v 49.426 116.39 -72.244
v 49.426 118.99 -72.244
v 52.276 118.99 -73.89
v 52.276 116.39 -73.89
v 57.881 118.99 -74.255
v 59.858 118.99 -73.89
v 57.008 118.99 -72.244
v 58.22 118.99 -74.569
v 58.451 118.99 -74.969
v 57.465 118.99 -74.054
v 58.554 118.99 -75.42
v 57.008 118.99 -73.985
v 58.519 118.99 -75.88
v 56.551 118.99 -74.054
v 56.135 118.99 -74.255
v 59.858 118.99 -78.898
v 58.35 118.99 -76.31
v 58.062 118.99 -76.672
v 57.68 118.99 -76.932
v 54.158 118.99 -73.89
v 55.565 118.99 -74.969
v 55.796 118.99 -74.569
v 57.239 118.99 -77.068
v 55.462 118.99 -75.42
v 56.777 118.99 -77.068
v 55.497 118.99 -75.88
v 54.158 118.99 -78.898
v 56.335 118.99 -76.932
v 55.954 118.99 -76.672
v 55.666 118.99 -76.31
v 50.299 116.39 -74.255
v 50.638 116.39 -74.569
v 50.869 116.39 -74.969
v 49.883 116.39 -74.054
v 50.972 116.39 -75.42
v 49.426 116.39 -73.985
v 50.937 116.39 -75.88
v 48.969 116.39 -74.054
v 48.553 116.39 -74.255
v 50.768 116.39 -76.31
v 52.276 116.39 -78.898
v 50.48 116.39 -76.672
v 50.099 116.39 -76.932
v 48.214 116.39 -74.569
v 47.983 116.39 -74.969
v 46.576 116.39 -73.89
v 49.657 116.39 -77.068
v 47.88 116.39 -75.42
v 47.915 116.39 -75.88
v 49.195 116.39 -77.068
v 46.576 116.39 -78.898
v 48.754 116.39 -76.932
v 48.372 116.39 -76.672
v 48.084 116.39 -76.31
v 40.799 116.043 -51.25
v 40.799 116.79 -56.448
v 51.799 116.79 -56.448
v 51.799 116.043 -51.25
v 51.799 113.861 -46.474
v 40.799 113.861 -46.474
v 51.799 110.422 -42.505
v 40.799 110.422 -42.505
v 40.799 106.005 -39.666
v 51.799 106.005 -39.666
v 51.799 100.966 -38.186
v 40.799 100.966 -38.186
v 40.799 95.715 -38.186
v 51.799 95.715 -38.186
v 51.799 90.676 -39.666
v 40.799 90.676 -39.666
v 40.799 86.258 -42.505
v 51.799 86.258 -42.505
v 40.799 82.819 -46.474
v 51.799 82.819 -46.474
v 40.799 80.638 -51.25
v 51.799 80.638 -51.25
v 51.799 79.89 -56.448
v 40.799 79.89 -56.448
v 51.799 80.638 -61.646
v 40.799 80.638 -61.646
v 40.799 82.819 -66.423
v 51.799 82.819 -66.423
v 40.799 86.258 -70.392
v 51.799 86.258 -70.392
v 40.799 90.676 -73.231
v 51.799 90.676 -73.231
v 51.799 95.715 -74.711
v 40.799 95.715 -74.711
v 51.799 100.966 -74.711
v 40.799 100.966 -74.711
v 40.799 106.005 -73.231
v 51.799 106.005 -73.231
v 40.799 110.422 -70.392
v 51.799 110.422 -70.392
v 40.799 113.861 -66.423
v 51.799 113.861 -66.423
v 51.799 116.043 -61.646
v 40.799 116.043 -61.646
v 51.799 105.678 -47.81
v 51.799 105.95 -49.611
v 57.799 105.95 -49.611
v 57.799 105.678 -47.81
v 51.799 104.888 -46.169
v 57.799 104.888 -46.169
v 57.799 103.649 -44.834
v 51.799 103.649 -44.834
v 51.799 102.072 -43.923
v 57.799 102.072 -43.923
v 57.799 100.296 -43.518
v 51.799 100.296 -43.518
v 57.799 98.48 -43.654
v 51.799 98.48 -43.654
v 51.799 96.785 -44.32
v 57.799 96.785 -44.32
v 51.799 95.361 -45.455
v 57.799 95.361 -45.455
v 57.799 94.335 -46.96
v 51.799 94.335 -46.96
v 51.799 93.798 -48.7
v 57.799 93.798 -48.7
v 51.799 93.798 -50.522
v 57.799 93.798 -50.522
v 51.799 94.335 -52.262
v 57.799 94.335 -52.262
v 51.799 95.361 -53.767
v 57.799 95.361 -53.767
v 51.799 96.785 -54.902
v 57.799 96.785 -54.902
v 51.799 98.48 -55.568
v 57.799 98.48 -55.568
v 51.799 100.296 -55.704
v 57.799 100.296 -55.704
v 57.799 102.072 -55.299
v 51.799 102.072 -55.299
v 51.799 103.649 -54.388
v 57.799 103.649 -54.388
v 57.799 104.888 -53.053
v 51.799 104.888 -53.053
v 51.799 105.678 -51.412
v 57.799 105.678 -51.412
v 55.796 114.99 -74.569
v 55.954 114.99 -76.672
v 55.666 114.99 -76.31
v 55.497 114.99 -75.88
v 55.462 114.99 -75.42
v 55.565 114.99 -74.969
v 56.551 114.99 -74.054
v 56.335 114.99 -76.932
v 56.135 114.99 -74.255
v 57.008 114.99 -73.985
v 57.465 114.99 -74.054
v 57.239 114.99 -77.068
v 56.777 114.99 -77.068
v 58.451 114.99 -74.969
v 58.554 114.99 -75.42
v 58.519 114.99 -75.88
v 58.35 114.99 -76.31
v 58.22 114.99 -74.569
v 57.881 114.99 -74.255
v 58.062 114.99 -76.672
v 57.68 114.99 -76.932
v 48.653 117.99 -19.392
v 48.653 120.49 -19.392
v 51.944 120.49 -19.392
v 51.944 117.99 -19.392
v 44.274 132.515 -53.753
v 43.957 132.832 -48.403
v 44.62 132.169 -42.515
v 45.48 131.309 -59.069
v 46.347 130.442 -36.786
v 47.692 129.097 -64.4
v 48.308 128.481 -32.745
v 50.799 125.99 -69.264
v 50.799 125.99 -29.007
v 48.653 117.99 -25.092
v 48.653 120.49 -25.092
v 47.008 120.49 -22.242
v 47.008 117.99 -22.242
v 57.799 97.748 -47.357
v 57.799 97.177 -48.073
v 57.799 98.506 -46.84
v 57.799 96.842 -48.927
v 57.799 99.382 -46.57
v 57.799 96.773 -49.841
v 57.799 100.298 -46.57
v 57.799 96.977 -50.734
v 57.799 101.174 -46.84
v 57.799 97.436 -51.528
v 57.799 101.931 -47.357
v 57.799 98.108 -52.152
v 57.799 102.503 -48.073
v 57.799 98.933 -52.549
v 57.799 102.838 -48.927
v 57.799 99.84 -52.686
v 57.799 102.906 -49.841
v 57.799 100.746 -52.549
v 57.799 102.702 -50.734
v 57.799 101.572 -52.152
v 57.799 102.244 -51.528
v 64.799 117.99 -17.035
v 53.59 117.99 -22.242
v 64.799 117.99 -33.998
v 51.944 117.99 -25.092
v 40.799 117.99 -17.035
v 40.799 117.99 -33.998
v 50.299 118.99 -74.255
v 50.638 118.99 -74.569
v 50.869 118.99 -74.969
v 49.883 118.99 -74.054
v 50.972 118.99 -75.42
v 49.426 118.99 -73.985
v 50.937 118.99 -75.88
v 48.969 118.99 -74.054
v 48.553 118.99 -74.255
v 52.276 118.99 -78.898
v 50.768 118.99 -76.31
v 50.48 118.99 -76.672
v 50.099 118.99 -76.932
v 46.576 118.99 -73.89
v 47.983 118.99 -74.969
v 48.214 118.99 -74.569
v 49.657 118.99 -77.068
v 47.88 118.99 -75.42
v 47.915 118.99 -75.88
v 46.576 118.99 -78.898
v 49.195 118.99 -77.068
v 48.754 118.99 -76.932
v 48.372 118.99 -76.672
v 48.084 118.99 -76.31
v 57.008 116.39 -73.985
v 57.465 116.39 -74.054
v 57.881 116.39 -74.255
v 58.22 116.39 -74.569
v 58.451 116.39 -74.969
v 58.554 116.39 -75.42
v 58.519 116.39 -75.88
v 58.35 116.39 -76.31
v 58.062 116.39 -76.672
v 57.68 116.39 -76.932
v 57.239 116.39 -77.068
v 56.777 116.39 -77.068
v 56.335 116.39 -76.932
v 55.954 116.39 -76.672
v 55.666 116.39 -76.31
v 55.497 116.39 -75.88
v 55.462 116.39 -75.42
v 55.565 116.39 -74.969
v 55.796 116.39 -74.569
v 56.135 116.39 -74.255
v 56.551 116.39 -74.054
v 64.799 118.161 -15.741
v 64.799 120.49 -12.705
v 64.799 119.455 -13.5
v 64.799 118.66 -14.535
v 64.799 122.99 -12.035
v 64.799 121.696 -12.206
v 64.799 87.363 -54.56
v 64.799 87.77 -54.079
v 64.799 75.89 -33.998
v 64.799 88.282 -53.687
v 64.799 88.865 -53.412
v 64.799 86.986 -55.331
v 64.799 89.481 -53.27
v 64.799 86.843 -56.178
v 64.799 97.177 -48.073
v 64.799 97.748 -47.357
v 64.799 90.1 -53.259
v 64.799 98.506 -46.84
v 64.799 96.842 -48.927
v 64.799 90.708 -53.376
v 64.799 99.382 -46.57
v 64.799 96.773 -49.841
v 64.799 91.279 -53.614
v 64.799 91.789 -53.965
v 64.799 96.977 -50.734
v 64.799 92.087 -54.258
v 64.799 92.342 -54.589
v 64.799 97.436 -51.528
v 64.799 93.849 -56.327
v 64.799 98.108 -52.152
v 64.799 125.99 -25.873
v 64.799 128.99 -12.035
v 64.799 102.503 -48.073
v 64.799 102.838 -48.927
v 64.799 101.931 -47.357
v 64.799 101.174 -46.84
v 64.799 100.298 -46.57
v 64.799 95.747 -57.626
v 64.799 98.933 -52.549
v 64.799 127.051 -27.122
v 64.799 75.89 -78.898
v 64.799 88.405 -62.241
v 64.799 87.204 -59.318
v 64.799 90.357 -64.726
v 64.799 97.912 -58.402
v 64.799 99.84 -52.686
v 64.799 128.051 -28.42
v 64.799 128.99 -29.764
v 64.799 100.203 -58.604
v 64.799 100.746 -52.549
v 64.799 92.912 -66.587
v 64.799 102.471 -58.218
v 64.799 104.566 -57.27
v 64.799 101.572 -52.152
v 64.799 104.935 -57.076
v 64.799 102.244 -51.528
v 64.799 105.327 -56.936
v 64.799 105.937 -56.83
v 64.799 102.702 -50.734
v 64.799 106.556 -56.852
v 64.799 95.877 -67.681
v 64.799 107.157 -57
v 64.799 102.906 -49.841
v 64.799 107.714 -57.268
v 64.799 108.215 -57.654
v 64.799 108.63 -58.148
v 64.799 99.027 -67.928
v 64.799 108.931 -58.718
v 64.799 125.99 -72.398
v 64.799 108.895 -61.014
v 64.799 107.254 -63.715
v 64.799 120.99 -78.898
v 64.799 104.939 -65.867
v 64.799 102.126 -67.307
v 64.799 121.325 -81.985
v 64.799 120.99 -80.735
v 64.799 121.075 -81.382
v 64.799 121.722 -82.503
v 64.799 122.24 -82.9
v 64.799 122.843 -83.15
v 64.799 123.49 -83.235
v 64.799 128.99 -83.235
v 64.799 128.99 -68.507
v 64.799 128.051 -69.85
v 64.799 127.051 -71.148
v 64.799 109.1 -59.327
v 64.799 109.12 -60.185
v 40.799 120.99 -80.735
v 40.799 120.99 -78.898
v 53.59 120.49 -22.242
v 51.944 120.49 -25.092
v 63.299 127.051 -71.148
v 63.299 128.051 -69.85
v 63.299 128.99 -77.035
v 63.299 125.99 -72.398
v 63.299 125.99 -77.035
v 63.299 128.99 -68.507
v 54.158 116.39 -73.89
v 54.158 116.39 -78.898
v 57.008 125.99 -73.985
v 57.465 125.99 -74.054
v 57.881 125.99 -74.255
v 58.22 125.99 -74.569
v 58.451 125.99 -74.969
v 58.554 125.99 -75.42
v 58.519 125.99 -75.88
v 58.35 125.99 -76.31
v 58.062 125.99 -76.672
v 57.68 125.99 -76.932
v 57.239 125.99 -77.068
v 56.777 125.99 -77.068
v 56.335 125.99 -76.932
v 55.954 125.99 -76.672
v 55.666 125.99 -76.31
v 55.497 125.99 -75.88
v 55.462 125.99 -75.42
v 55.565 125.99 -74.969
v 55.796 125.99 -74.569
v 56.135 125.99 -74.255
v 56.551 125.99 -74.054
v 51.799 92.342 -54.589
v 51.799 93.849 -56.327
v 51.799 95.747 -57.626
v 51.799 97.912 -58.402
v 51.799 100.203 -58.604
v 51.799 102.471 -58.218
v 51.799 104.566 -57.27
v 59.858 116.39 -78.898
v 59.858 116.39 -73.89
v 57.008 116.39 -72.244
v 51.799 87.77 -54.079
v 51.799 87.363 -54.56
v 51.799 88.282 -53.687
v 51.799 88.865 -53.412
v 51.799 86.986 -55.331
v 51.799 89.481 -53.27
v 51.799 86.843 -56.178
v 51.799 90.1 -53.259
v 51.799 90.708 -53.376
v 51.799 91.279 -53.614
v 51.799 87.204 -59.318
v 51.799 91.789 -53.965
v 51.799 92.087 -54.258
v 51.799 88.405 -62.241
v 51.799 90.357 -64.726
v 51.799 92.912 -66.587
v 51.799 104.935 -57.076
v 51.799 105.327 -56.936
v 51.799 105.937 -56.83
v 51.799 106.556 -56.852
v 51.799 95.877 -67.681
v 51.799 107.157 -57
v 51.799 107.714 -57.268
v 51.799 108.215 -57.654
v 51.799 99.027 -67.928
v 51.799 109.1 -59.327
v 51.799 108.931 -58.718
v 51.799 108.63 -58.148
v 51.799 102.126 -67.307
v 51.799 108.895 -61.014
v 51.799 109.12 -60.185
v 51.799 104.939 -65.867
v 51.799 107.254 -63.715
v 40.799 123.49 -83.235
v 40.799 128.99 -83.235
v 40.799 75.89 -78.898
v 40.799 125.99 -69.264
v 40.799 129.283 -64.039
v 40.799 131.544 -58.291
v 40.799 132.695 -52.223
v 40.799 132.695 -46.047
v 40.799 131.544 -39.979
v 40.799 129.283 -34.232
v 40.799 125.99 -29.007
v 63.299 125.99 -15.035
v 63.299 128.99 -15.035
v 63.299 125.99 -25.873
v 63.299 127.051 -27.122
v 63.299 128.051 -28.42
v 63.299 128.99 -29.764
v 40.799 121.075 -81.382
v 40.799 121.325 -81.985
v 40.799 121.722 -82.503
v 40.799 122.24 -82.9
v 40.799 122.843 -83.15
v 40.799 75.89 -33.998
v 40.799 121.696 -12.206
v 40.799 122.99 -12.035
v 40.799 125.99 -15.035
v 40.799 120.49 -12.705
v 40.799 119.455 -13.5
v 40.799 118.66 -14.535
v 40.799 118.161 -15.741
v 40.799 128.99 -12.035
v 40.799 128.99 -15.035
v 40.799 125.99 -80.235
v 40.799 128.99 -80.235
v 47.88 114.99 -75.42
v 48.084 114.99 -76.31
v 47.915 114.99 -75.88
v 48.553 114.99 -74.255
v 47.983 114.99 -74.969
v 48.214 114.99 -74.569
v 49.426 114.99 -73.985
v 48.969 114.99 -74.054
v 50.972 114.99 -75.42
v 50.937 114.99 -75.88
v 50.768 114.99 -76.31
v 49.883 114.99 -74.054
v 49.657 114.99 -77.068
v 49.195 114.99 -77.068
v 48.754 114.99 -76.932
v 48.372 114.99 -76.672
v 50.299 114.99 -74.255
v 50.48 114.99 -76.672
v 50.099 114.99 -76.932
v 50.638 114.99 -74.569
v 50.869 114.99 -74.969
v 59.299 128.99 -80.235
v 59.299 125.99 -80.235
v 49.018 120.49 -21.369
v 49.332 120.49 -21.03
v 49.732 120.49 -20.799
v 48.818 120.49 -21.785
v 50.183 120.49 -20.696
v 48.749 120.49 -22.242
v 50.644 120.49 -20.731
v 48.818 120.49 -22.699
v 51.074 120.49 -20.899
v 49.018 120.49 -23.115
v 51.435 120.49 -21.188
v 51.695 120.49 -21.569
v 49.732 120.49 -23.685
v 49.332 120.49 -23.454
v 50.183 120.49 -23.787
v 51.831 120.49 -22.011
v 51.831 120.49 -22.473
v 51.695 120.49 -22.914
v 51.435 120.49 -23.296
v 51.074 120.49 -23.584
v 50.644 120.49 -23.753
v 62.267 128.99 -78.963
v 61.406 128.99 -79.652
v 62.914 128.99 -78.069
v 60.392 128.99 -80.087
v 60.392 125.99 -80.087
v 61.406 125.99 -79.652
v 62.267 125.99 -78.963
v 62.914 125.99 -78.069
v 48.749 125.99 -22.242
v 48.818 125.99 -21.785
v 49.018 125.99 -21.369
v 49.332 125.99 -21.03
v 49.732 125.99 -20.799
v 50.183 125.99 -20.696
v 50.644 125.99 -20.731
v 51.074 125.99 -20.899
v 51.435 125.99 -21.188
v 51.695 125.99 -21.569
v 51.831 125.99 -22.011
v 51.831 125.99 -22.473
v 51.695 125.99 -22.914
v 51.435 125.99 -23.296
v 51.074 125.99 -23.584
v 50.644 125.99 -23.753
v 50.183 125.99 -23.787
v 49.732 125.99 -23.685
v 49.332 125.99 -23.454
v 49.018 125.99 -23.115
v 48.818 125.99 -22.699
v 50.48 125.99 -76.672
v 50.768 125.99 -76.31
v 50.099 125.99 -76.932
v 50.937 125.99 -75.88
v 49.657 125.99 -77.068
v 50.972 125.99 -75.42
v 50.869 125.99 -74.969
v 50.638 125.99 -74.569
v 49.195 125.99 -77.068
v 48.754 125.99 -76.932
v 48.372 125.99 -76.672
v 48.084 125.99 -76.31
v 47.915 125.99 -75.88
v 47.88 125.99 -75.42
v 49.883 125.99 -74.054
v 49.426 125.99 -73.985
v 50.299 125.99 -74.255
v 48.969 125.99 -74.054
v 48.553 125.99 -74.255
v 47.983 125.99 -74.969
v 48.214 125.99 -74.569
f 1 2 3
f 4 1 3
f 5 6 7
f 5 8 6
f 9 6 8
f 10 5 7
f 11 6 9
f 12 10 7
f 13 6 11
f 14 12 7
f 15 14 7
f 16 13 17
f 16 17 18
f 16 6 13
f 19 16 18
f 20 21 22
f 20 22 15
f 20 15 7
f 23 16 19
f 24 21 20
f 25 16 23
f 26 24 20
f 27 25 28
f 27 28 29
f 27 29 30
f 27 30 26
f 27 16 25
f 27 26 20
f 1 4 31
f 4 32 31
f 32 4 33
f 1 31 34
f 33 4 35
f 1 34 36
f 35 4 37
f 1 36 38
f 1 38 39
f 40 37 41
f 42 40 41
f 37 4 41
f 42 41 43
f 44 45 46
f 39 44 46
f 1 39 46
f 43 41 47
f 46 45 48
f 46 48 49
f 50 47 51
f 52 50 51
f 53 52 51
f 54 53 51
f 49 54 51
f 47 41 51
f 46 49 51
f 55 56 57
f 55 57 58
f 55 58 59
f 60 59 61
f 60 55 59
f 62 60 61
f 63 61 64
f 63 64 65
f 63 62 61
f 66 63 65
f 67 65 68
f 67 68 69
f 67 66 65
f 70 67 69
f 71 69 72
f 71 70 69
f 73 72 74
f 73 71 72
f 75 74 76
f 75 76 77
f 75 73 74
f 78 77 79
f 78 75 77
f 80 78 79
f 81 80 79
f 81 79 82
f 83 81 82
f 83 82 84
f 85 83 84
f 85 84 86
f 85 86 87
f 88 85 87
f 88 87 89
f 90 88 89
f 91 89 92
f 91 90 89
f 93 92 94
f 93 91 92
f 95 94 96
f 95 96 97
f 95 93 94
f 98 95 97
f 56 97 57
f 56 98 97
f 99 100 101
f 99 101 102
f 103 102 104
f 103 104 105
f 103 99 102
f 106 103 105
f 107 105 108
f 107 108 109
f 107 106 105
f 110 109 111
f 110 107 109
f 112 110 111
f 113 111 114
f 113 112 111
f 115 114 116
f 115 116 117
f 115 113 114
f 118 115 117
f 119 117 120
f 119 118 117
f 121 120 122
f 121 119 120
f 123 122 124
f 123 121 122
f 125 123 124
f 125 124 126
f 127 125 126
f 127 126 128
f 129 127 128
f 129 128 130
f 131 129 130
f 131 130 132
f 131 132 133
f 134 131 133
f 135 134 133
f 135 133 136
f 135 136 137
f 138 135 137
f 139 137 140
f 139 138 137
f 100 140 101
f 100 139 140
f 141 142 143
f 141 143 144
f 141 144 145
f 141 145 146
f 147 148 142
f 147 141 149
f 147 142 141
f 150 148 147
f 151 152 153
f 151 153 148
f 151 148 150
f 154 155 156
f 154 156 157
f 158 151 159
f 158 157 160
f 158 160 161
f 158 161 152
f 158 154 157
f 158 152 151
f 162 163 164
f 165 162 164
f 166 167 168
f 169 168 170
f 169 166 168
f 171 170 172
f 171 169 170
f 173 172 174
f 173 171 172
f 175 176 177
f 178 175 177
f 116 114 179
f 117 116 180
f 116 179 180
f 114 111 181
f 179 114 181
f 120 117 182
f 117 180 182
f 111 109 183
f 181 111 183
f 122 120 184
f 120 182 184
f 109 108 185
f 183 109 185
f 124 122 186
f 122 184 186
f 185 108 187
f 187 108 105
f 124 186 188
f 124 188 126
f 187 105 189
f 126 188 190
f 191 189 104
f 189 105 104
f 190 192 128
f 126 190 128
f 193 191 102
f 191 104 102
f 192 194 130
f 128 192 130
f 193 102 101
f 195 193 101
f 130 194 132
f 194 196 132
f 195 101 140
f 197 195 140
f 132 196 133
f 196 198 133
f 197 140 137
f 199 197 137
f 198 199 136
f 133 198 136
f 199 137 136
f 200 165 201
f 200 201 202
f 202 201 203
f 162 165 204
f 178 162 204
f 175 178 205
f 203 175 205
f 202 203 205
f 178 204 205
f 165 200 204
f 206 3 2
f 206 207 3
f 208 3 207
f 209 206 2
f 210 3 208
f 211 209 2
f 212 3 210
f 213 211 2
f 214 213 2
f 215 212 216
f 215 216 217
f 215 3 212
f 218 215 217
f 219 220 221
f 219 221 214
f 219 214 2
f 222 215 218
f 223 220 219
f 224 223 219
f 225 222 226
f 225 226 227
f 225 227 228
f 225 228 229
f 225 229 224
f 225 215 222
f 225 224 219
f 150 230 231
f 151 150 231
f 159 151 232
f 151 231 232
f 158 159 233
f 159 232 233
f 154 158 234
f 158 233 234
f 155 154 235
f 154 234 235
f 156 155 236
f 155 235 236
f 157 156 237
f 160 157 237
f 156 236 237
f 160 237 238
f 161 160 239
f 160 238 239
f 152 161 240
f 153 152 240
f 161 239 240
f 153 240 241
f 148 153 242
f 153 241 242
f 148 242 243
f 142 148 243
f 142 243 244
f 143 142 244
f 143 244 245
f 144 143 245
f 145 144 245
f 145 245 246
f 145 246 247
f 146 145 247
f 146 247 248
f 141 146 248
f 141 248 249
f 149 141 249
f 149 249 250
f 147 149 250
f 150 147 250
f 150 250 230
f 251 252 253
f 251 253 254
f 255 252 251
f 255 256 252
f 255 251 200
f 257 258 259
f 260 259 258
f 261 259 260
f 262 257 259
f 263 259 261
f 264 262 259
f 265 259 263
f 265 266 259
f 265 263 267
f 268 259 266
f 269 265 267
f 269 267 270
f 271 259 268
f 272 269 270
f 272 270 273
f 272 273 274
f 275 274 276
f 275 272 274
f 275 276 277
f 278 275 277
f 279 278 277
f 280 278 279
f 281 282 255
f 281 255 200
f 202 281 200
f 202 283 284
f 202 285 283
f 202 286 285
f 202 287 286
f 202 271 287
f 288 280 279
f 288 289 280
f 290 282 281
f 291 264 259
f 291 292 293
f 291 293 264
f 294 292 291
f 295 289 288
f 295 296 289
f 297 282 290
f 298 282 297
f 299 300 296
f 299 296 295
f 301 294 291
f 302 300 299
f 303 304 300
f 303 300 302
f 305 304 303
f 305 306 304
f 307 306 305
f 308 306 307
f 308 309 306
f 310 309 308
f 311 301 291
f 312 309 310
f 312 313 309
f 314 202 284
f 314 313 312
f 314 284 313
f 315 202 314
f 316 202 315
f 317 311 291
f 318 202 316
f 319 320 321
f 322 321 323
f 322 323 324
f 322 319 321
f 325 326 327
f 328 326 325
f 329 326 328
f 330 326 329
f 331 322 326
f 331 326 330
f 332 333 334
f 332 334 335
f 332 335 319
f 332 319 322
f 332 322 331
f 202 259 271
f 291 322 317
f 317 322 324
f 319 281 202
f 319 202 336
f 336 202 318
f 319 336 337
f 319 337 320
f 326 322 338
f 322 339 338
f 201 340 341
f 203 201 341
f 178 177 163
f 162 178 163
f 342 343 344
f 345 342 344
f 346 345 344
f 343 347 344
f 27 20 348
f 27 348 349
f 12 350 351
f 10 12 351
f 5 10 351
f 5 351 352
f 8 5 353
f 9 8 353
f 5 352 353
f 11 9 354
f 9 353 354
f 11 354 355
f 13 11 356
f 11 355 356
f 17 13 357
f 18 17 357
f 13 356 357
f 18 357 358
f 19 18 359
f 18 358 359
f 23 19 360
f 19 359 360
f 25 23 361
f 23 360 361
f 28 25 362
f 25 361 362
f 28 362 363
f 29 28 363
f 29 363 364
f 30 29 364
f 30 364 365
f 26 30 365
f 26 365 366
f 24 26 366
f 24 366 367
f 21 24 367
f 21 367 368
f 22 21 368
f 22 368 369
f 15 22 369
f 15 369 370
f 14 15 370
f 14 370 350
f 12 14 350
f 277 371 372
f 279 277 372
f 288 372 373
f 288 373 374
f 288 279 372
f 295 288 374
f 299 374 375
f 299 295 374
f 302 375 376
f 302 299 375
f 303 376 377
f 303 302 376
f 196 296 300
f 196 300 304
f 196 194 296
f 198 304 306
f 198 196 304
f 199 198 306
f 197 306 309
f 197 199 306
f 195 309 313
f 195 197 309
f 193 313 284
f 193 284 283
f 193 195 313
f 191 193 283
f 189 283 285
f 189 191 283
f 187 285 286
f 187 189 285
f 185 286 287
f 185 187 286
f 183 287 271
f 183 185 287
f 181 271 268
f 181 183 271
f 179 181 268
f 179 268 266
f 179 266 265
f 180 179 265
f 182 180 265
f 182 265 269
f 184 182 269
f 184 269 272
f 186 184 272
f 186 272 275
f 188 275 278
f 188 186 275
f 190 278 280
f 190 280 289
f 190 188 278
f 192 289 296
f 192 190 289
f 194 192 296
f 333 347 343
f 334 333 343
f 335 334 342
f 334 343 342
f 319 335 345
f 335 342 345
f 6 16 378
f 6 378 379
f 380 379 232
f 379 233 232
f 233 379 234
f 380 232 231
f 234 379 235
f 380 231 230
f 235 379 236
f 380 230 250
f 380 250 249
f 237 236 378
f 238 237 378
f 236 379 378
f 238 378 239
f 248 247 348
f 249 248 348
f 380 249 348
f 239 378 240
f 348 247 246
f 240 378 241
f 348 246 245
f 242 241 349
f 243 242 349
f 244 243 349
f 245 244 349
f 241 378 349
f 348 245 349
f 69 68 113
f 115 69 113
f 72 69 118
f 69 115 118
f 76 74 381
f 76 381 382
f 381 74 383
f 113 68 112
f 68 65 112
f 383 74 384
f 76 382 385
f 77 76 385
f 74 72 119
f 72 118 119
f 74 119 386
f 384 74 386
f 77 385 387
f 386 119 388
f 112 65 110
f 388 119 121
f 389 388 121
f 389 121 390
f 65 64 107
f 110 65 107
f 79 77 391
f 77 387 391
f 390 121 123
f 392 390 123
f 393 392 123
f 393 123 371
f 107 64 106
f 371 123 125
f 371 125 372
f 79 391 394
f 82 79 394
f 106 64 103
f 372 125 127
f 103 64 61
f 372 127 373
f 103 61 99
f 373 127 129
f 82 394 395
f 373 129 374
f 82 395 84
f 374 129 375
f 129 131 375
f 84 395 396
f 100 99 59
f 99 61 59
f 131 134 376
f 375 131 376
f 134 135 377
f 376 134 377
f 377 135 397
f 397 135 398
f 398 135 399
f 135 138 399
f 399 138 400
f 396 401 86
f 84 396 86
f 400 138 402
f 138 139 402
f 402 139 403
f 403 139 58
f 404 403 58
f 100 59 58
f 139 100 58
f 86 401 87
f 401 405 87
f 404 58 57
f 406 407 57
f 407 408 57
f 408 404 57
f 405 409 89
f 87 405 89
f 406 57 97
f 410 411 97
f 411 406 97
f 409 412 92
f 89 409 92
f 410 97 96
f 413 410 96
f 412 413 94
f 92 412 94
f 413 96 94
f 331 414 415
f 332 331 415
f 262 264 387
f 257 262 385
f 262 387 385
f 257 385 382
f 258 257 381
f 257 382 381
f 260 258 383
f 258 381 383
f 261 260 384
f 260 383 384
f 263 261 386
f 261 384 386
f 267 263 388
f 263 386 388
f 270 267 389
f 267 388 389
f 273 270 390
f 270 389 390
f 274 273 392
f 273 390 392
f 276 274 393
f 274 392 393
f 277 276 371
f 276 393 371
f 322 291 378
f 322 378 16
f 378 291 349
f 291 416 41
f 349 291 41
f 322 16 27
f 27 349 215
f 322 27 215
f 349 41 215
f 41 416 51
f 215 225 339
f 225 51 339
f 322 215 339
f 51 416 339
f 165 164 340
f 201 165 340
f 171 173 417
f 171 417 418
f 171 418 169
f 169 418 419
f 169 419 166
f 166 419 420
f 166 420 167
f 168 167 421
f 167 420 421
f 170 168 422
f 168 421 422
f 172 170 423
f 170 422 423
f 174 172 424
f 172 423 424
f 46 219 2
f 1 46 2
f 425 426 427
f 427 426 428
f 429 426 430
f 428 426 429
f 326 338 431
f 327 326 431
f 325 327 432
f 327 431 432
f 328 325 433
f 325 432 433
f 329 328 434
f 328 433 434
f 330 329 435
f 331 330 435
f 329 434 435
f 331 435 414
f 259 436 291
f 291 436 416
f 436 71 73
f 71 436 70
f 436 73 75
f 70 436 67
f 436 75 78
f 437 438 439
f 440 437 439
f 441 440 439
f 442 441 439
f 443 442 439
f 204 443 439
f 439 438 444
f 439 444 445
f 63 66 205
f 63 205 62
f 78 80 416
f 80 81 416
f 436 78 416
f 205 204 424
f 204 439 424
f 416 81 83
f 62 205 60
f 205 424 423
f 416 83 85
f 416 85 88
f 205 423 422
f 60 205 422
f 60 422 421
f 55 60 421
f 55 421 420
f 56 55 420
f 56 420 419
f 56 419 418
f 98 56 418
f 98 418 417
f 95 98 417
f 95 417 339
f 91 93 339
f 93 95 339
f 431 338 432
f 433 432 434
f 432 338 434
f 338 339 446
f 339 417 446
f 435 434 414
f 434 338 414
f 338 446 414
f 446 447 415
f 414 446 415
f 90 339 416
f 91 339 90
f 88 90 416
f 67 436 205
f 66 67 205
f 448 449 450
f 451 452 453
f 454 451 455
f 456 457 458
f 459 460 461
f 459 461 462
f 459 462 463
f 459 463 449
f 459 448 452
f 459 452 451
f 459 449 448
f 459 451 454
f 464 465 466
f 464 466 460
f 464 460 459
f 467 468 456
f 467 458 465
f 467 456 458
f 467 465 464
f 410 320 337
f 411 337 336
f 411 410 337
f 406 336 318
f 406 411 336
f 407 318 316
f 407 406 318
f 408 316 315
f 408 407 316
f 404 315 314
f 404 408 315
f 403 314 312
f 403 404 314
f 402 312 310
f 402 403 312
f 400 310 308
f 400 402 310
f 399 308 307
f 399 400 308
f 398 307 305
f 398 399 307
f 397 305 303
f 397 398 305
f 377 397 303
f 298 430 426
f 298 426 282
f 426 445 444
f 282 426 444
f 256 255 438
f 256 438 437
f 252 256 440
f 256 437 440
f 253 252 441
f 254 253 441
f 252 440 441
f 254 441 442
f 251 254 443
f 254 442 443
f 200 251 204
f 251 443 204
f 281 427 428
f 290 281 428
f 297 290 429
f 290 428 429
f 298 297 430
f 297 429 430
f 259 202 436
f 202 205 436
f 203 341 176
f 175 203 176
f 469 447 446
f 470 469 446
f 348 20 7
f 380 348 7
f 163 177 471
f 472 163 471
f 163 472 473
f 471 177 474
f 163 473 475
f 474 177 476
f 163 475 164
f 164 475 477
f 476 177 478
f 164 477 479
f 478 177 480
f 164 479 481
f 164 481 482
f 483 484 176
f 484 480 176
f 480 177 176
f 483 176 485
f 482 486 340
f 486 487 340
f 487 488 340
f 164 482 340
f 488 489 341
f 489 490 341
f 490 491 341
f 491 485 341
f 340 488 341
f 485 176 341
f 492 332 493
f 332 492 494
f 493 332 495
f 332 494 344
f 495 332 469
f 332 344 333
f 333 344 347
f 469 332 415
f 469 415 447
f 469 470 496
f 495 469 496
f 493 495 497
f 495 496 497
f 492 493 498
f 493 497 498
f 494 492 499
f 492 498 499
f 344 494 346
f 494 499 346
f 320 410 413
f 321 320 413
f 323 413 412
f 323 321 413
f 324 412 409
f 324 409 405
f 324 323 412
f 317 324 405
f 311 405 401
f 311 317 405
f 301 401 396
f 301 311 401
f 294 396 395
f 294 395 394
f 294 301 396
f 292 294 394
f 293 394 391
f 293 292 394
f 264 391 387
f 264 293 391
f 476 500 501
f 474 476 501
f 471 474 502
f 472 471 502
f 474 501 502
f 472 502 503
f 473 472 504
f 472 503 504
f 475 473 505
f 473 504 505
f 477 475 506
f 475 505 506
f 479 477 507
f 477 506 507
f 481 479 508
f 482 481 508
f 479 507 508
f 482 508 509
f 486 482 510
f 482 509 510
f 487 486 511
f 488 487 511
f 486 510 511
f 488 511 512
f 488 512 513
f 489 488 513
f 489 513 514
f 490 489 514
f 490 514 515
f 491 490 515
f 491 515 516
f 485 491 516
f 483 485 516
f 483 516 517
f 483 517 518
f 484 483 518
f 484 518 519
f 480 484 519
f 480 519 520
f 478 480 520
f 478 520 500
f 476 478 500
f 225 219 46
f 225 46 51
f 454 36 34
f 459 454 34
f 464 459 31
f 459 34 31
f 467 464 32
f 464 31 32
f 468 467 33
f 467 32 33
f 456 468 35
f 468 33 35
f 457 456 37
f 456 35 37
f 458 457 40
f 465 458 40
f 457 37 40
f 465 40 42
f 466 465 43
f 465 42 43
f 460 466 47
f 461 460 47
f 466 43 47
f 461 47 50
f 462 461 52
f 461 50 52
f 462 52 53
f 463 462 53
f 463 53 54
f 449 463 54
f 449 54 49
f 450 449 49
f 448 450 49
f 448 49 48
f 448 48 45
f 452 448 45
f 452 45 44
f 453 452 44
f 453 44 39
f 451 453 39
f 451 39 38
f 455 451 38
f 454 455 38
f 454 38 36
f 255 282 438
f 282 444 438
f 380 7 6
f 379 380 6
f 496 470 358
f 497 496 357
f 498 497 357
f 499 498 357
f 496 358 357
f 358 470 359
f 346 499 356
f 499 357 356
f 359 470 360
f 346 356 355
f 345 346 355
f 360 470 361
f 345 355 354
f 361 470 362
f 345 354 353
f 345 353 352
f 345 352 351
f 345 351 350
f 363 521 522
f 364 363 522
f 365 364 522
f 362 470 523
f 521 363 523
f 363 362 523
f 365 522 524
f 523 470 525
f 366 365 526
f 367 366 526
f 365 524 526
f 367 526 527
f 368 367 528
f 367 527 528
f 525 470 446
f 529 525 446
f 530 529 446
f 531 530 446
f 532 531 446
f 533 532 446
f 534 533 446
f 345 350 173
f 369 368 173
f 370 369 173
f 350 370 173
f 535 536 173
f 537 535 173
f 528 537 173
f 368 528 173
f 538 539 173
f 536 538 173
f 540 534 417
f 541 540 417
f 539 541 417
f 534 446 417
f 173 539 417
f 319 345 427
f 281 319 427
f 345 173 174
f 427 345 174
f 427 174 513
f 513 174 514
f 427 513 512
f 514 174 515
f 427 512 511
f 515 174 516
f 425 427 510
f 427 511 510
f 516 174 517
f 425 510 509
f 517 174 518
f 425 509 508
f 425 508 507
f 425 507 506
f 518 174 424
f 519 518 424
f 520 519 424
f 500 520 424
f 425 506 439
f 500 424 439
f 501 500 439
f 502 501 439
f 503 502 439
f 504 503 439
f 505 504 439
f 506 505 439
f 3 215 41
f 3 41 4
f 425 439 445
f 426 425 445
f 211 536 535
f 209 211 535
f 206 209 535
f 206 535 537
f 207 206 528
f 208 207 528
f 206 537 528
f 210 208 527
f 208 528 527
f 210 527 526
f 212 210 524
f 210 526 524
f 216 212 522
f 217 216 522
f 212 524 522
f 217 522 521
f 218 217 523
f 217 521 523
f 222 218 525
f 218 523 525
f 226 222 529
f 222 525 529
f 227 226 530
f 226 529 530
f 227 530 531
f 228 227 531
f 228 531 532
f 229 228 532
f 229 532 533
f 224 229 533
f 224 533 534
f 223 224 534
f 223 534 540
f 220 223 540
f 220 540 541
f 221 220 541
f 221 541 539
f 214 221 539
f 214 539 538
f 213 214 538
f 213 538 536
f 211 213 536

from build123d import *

# Parameters (mm, degrees)
SKETCH1_R           = 3.075
BOSS_EXTRUDE1_DEPTH = 5.5
BOSS_EXTRUDE2_START = -6
SKETCH1_3_R         = 6.11
BOSS_EXTRUDE2_DEPTH = 6
BOSS_EXTRUDE3_START = -17
SKETCH1_4_R         = 18.45
BOSS_EXTRUDE3_DEPTH = 11
BOSS_EXTRUDE4_DEPTH = 10
DRAFT1_ANGLE        = 45
BOSS_EXTRUDE5_DEPTH = 3
SKETCH4_R           = 3.075
BOSS_EXTRUDE6_DEPTH = 1.5
SKETCH3_3_R         = 1.55
CUT_EXTRUDE1_DEPTH  = 11
CUT_EXTRUDE2_START  = -7
SKETCH3_4_R         = 1.55
CUT_EXTRUDE2_DEPTH  = 2.6
CUT_EXTRUDE4_START  = -5.5
SKETCH3_5_R         = 1.55
CUT_EXTRUDE4_DEPTH  = 2.5
CUT_EXTRUDE5_START  = -13
CUT_EXTRUDE5_DEPTH  = 13
FILLET1_R           = 3


with BuildPart() as part:
    # Sketch1 → Boss-Extrude1 (new body)
    with BuildSketch(Plane(origin=(57.798756402, 0, 0), x_dir=(0, 0, -1), z_dir=(1, 0, 0))):
        with BuildLine():
            Line((33.998459558, 75.890266162), (78.898459558, 75.890266162))
            Line((78.898459558, 75.890266162), (78.898459558, 120.990266162))
            Line((78.898459558, 120.990266162), (80.735339486, 120.990266162))
            ThreePointArc((80.735339486, 120.990266162), (82.503106439, 121.722499209), (83.235339486, 123.490266162))
            Line((83.235339486, 123.490266162), (83.235339486, 128.990266162))
            Line((83.235339486, 128.990266162), (80.235339486, 128.990266162))
            Line((80.235339486, 128.990266162), (80.235339486, 125.990266162))
            Line((80.235339486, 125.990266162), (15.035339486, 125.990266162))
            Line((15.035339486, 125.990266162), (15.035339486, 128.990266162))
            Line((15.035339486, 128.990266162), (12.035339486, 128.990266162))
            Line((12.035339486, 128.990266162), (12.035339486, 122.990266162))
            ThreePointArc((12.035339486, 122.990266162), (13.49980558, 119.454732256), (17.035339486, 117.990266162))
            Line((17.035339486, 117.990266162), (33.998459558, 117.990266162))
            Line((33.998459558, 117.990266162), (33.998459558, 75.890266162))
        make_face()
        with Locations((49.610967501, 99.839833556)):
            Circle(SKETCH1_R, mode=Mode.SUBTRACT)
    extrude(amount=BOSS_EXTRUDE1_DEPTH)

    # Sketch1<3> → Boss-Extrude2 (add)
    with BuildSketch(Plane(origin=(57.798756402, 0, 0), x_dir=(0, 0, -1), z_dir=(1, 0, 0)).offset(BOSS_EXTRUDE2_START)):
        with BuildLine():
            Line((33.998459558, 75.890266162), (78.898459558, 75.890266162))
            Line((78.898459558, 75.890266162), (78.898459558, 120.990266162))
            Line((78.898459558, 120.990266162), (80.735339486, 120.990266162))
            ThreePointArc((80.735339486, 120.990266162), (82.503106439, 121.722499209), (83.235339486, 123.490266162))
            Line((83.235339486, 123.490266162), (83.235339486, 128.990266162))
            Line((83.235339486, 128.990266162), (80.235339486, 128.990266162))
            Line((80.235339486, 128.990266162), (80.235339486, 125.990266162))
            Line((80.235339486, 125.990266162), (15.035339486, 125.990266162))
            Line((15.035339486, 125.990266162), (15.035339486, 128.990266162))
            Line((15.035339486, 128.990266162), (12.035339486, 128.990266162))
            Line((12.035339486, 128.990266162), (12.035339486, 122.990266162))
            ThreePointArc((12.035339486, 122.990266162), (13.49980558, 119.454732256), (17.035339486, 117.990266162))
            Line((17.035339486, 117.990266162), (33.998459558, 117.990266162))
            Line((33.998459558, 117.990266162), (33.998459558, 75.890266162))
        make_face()
        with Locations(Location((49.610967501, 99.839833556, 0), (0, 0, 90))):
            Circle(SKETCH1_3_R, mode=Mode.SUBTRACT)
    extrude(amount=BOSS_EXTRUDE2_DEPTH)

    # Sketch1<4> → Boss-Extrude3 (add)
    with BuildSketch(Plane(origin=(57.798756402, 0, 0), x_dir=(0, 0, -1), z_dir=(1, 0, 0)).offset(BOSS_EXTRUDE3_START)):
        with BuildLine():
            Line((33.998459558, 75.890266162), (78.898459558, 75.890266162))
            Line((78.898459558, 75.890266162), (78.898459558, 120.990266162))
            Line((78.898459558, 120.990266162), (80.735339486, 120.990266162))
            ThreePointArc((80.735339486, 120.990266162), (82.503106439, 121.722499209), (83.235339486, 123.490266162))
            Line((83.235339486, 123.490266162), (83.235339486, 128.990266162))
            Line((83.235339486, 128.990266162), (80.235339486, 128.990266162))
            Line((80.235339486, 128.990266162), (80.235339486, 125.990266162))
            Line((80.235339486, 125.990266162), (15.035339486, 125.990266162))
            Line((15.035339486, 125.990266162), (15.035339486, 128.990266162))
            Line((15.035339486, 128.990266162), (12.035339486, 128.990266162))
            Line((12.035339486, 128.990266162), (12.035339486, 122.990266162))
            ThreePointArc((12.035339486, 122.990266162), (13.49980558, 119.454732256), (17.035339486, 117.990266162))
            Line((17.035339486, 117.990266162), (33.998459558, 117.990266162))
            Line((33.998459558, 117.990266162), (33.998459558, 75.890266162))
        make_face()
        with Locations(Location((56.448459558, 98.340266162, 0), (0, 0, 90))):
            Circle(SKETCH1_4_R, mode=Mode.SUBTRACT)
    extrude(amount=BOSS_EXTRUDE3_DEPTH)

    # Sketch2 → Boss-Extrude4 (add)
    with BuildSketch(Plane(origin=(40.798756402, 0, 0), x_dir=(0, 0, -1), z_dir=(1, 0, 0))):
        with BuildLine():
            ThreePointArc((69.263798804, 125.990266162), (49.135339486, 132.839833556), (29.006880169, 125.990266162))
            Line((29.006880169, 125.990266162), (69.263798804, 125.990266162))
        make_face()
    extrude(amount=BOSS_EXTRUDE4_DEPTH)

    # Draft1
    draft1_faces = [part.faces().sort_by_distance(p)[0] for p in [
        (50.798756402, 128.756028079, -49.135339486),
    ]]
    draft(draft1_faces, Plane(origin=(152.119080652, 125.990266162, 0), x_dir=(1, 0, 0), z_dir=(0, 1, 0)), DRAFT1_ANGLE)

    # Sketch3 → Boss-Extrude5 (add)
    with BuildSketch(Plane(origin=(0, 125.990266162, 0), x_dir=(1, 0, 0), z_dir=(0, 1, 0))):
        with BuildLine():
            Line((63.298756402, 80.235339486), (59.298756401, 80.235339486))
            ThreePointArc((59.298756401, 80.235339486), (61.860006097, 79.336901605), (63.298756402, 77.035339486))
            Line((63.298756402, 77.035339486), (63.298756402, 80.235339486))
        make_face()
    extrude(amount=BOSS_EXTRUDE5_DEPTH)

    # Sketch4 → Boss-Extrude6 (add)
    with BuildSketch(Plane(origin=(63.298756402, 0, 0), x_dir=(0, 0, -1), z_dir=(1, 0, 0))):
        with BuildLine():
            Line((29.763910038, 128.990266162), (12.035339486, 128.990266162))
            Line((12.035339486, 128.990266162), (12.035339486, 122.990266162))
            ThreePointArc((12.035339486, 122.990266162), (13.49980558, 119.454732256), (17.035339486, 117.990266162))
            Line((17.035339486, 117.990266162), (33.998459558, 117.990266162))
            Line((33.998459558, 117.990266162), (33.998459558, 75.890266162))
            Line((33.998459558, 75.890266162), (78.898459558, 75.890266162))
            Line((78.898459558, 75.890266162), (78.898459558, 120.990266162))
            Line((78.898459558, 120.990266162), (80.735339486, 120.990266162))
            ThreePointArc((80.735339486, 120.990266162), (82.503106439, 121.722499209), (83.235339486, 123.490266162))
            Line((83.235339486, 123.490266162), (83.235339486, 128.990266162))
            Line((83.235339486, 128.990266162), (68.506768934, 128.990266162))
            ThreePointArc((68.506768934, 128.990266162), (70.505131495, 127.558635649), (72.398075234, 125.990266162))
            Line((72.398075234, 125.990266162), (25.872603738, 125.990266162))
            ThreePointArc((25.872603738, 125.990266162), (27.765547478, 127.558635649), (29.763910038, 128.990266162))
        make_face()
        with Locations((49.610967501, 99.839833556)):
            Circle(SKETCH4_R, mode=Mode.SUBTRACT)
    extrude(amount=BOSS_EXTRUDE6_DEPTH)

    # Sketch3<3> → Cut-Extrude1 (cut)
    with BuildSketch(Plane(origin=(0, 125.990266162, 0), x_dir=(1, 0, 0), z_dir=(0, 1, 0))):
        with Locations(Location((49.426066799, 75.535339486, 0), (0, 0, 270))):
            Circle(SKETCH3_3_R)
        with Locations(Location((57.007859867, 75.535339486, 0), (0, 0, 270))):
            Circle(SKETCH3_3_R)
        with Locations(Location((50.298756402, 22.24178562, 0), (0, 0, 180))):
            Circle(SKETCH3_3_R)
    extrude(amount=-CUT_EXTRUDE1_DEPTH, mode=Mode.SUBTRACT)

    # Sketch3<4> → Cut-Extrude2 (cut)
    # profile 1 of 4: a face of its own
    with BuildSketch(Plane(origin=(0, 125.990266162, 0), x_dir=(1, 0, 0), z_dir=(0, 1, 0)).offset(CUT_EXTRUDE2_START)):
        Polygon((54.157859867, 77.180787753), (54.157859867, 73.889891219), (57.007859867, 72.244442952), (59.857859867, 73.889891219), (59.857859867, 77.180787753), (57.007859867, 78.826236021), align=None)
        with Locations(Location((57.007859867, 75.535339486, 0), (0, 0, 270))):
            Circle(SKETCH3_4_R, mode=Mode.SUBTRACT)
    # profile 2 of 4: a face of its own
    with BuildSketch(Plane(origin=(0, 125.990266162, 0), x_dir=(1, 0, 0), z_dir=(0, 1, 0)).offset(CUT_EXTRUDE2_START)):
        Polygon((46.576066799, 77.180787753), (46.576066799, 73.889891219), (49.426066799, 72.244442952), (52.276066799, 73.889891219), (52.276066799, 77.180787753), (49.426066799, 78.826236021), align=None)
        with Locations(Location((49.426066799, 75.535339486, 0), (0, 0, 270))):
            Circle(SKETCH3_4_R, mode=Mode.SUBTRACT)
    # profile 3 of 4: a face of its own
    with BuildSketch(Plane(origin=(0, 125.990266162, 0), x_dir=(1, 0, 0), z_dir=(0, 1, 0)).offset(CUT_EXTRUDE2_START)):
        Polygon((59.857859867, 78.898459558), (59.857859867, 77.180787753), (57.007859867, 78.826236021), (54.157859867, 77.180787753), (54.157859867, 78.898459558), align=None)
    # profile 4 of 4: a face of its own
    with BuildSketch(Plane(origin=(0, 125.990266162, 0), x_dir=(1, 0, 0), z_dir=(0, 1, 0)).offset(CUT_EXTRUDE2_START)):
        Polygon((52.276066799, 78.898459558), (52.276066799, 77.180787753), (49.426066799, 78.826236021), (46.576066799, 77.180787753), (46.576066799, 78.898459558), align=None)
    extrude(amount=-CUT_EXTRUDE2_DEPTH, mode=Mode.SUBTRACT)

    # Sketch3<5> → Cut-Extrude4 (cut)
    with BuildSketch(Plane(origin=(0, 125.990266162, 0), x_dir=(1, 0, 0), z_dir=(0, 1, 0)).offset(CUT_EXTRUDE4_START)):
        Polygon((48.653308134, 19.39178562), (51.944204669, 19.39178562), (53.589652936, 22.24178562), (51.944204669, 25.09178562), (48.653308134, 25.09178562), (47.007859867, 22.24178562), align=None)
        with Locations(Location((50.298756402, 22.24178562, 0), (0, 0, 180))):
            Circle(SKETCH3_5_R, mode=Mode.SUBTRACT)
    extrude(amount=-CUT_EXTRUDE4_DEPTH, mode=Mode.SUBTRACT)

    # Sketch6 → Cut-Extrude5 (cut)
    with BuildSketch(Plane.ZY.offset(-51.798756402).offset(CUT_EXTRUDE5_START)):
        with BuildLine():
            ThreePointArc((-47.52627647, 91.08460293), (-58.402028717, 97.911818335), (-51.38169206, 108.663921867))
            ThreePointArc((-51.38169206, 108.663921867), (-67.681482224, 95.876691159), (-47.52627647, 91.08460293))
        make_face()
    extrude(amount=CUT_EXTRUDE5_DEPTH, mode=Mode.SUBTRACT)

    # Fillet1
    fillet1_edges = [part.edges().sort_by_distance(p)[0] for p in [
        (58.298756402, 91.08460293, -47.52627647),
        (58.298756402, 108.663921867, -51.38169206),
    ]]
    fillet(fillet1_edges, radius=FILLET1_R)


solid = part.part
